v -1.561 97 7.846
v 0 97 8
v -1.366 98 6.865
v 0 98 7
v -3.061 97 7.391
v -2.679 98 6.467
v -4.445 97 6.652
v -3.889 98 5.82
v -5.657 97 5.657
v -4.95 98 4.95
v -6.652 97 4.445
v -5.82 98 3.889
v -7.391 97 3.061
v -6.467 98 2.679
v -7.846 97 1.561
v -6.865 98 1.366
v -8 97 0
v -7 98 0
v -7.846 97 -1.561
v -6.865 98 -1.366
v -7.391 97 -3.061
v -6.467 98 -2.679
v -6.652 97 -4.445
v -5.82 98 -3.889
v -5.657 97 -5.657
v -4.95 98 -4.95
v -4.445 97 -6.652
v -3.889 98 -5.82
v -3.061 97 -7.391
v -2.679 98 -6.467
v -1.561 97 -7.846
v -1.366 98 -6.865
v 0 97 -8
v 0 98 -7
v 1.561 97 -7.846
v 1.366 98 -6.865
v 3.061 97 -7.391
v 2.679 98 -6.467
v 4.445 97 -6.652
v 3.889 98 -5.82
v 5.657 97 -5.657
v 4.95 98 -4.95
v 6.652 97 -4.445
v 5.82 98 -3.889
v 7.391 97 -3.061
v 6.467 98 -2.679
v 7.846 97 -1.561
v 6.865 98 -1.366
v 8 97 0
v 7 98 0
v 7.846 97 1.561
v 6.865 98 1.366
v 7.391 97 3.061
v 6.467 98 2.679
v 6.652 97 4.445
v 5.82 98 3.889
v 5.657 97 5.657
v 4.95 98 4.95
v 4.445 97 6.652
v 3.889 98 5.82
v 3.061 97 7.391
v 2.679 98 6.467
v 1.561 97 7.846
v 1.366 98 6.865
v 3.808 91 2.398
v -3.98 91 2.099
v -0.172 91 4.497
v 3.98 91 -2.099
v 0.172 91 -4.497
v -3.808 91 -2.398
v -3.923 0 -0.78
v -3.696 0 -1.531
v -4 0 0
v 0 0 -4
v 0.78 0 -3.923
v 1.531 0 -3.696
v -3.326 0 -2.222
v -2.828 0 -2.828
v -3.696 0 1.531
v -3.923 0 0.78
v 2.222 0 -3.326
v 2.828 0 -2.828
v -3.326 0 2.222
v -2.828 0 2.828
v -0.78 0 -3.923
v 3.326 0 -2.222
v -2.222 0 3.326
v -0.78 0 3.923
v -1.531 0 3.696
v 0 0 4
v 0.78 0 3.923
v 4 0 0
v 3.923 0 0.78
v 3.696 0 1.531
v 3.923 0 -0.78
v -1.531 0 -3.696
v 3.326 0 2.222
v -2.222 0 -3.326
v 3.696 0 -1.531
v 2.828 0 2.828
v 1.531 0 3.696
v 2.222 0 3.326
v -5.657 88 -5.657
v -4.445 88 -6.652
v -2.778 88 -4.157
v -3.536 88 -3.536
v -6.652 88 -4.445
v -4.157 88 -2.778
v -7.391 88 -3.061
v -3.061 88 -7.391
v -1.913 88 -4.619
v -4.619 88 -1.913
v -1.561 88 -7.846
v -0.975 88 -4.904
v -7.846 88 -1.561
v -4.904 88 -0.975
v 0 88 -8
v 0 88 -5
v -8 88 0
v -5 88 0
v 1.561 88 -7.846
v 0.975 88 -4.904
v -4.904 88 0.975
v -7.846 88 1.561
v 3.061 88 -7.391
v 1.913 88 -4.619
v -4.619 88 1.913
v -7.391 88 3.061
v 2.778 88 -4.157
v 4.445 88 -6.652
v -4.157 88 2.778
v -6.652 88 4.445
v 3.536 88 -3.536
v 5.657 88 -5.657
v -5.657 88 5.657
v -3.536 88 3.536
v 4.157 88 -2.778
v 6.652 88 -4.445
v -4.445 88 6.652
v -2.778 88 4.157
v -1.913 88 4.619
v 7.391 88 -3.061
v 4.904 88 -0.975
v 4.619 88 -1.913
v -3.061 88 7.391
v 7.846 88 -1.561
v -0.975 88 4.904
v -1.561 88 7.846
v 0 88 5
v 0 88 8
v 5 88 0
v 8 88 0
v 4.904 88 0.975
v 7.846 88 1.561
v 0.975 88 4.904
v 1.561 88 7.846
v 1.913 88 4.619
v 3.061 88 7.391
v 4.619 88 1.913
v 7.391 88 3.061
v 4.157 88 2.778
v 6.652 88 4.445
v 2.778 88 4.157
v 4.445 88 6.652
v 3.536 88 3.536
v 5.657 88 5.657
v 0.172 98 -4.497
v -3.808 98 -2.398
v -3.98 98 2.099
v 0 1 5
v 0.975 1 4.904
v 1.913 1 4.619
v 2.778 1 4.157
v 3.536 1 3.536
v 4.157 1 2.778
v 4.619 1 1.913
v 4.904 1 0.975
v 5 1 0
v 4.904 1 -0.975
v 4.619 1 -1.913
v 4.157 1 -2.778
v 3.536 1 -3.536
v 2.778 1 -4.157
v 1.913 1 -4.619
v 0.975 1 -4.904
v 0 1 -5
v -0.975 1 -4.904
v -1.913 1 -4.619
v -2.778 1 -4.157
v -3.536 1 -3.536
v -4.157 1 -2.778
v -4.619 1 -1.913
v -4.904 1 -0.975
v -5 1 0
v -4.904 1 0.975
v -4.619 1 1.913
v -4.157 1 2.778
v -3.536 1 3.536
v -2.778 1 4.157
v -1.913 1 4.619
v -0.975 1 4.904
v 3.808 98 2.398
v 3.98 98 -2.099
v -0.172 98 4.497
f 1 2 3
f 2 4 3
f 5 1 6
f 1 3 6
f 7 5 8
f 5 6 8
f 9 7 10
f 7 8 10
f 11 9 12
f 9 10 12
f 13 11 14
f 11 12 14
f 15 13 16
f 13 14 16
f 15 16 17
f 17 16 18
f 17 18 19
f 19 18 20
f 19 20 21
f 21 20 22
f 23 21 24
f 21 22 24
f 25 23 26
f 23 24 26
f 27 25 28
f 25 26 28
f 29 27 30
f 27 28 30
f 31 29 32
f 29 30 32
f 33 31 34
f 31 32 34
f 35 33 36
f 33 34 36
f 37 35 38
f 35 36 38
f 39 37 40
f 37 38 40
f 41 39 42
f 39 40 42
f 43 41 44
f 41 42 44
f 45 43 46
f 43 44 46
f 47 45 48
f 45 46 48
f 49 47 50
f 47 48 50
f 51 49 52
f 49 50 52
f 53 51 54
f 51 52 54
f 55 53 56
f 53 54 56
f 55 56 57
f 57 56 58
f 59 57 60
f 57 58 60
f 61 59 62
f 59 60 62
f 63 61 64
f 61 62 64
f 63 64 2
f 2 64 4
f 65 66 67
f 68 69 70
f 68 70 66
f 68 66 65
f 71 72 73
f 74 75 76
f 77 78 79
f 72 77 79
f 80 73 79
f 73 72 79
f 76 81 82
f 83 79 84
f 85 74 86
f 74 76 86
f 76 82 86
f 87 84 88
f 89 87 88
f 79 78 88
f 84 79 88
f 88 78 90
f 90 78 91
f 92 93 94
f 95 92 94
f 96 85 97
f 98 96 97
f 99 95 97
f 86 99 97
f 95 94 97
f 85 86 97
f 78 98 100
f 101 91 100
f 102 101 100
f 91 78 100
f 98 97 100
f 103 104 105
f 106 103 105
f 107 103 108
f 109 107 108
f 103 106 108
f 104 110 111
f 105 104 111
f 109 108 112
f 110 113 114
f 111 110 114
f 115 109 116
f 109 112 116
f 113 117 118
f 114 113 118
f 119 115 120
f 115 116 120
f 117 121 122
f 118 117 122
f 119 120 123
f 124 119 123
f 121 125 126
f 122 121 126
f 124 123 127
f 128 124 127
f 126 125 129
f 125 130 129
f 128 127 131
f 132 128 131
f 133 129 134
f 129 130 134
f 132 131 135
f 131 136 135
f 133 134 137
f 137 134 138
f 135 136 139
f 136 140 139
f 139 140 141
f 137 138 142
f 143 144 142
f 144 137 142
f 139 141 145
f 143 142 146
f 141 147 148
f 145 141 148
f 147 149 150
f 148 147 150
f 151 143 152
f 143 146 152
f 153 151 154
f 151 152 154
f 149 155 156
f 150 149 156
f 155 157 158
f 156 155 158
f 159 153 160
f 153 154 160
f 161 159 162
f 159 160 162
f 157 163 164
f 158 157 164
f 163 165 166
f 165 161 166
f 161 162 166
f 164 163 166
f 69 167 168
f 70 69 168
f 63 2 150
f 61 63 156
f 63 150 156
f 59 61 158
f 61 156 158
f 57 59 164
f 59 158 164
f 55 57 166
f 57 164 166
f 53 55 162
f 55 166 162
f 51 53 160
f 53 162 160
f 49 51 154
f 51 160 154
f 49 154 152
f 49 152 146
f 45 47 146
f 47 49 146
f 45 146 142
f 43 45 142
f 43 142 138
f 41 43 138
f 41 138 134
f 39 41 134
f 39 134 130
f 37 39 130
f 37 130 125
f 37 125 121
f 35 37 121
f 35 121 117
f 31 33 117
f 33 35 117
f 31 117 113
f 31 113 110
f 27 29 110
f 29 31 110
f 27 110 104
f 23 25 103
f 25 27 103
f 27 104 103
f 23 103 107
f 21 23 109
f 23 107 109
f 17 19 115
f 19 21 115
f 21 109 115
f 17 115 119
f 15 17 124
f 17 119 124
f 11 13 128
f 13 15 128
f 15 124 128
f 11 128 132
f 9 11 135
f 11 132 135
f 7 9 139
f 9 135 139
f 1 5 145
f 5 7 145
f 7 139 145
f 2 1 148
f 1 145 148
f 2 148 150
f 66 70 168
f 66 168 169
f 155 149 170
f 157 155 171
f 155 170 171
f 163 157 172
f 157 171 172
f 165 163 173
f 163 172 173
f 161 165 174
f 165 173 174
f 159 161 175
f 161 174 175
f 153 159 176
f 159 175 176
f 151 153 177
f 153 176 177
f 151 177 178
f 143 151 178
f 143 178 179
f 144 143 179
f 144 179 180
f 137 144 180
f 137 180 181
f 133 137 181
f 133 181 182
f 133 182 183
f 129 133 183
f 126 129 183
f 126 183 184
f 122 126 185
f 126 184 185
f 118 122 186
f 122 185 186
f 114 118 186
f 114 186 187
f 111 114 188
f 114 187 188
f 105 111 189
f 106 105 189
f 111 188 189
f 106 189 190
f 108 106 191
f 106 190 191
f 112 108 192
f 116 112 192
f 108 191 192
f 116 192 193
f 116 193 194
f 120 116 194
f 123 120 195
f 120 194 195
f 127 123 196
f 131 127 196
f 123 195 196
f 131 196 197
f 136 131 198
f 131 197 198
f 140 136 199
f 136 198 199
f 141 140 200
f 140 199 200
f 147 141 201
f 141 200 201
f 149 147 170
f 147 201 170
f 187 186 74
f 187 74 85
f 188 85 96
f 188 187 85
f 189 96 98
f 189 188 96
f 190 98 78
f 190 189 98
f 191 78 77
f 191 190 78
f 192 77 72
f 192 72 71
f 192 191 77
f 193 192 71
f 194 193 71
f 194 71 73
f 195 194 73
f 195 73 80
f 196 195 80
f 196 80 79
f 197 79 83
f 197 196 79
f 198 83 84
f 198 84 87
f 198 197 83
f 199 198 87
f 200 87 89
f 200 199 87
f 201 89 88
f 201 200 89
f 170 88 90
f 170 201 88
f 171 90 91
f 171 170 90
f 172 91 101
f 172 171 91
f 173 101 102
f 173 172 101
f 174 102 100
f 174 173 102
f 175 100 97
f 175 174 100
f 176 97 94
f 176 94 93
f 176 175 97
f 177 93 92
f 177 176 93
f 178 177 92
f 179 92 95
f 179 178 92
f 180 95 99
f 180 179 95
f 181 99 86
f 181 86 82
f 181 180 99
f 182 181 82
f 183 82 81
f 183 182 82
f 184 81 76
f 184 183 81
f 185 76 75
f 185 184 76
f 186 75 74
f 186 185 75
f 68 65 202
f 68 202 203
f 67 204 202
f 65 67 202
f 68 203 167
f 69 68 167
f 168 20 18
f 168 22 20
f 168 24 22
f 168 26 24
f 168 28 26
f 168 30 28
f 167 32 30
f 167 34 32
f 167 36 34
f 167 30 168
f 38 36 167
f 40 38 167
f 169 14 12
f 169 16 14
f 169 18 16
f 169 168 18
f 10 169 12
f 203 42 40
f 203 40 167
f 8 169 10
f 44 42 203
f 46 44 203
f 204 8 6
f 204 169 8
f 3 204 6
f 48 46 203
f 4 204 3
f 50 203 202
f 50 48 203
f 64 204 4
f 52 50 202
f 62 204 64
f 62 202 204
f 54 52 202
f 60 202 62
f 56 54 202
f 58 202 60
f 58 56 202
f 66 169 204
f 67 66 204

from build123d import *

# Parameters (mm, degrees)
SKETCH1_R           = 5
BOSS_EXTRUDE1_DEPTH = 88
SKETCH2_R           = 8
BOSS_EXTRUDE2_DEPTH = 10
CUT_EXTRUDE1_DEPTH  = 7


with BuildPart() as part:
    # Sketch1 → Boss-Extrude1 (new body)
    with BuildSketch(Plane(origin=(0, 0, 0), x_dir=(1, 0, 0), z_dir=(0, 1, 0))):
        with Locations(Location((0, 0, 0), (0, 0, 270))):
            Circle(SKETCH1_R)
    extrude(amount=BOSS_EXTRUDE1_DEPTH)

    # Sketch2 → Boss-Extrude2 (add)
    with BuildSketch(Plane(origin=(0, 88, 0), x_dir=(1, 0, 0), z_dir=(0, 1, 0))):
        with Locations(Location((0, 0, 0), (0, 0, 270))):
            Circle(SKETCH2_R)
    extrude(amount=BOSS_EXTRUDE2_DEPTH)

    # Sketch3 → Cut-Revolve1 (revolve, cut)
    with BuildSketch(Plane.XY, mode=Mode.PRIVATE) as cut_revolve1_sk:
        Polygon((8, 98), (8, 97), (7, 98), align=None)
    revolve(cut_revolve1_sk.sketch.rotate(Axis((0, 98, 0), (0, -1, 0)), 90), axis=Axis((0, 98, 0), (0, -1, 0)), mode=Mode.SUBTRACT)

    # Sketch4 → Cut-Revolve2 (revolve, cut)
    with BuildSketch(Plane.XY, mode=Mode.PRIVATE) as cut_revolve2_sk:
        Polygon((5, 0), (4, 0), (5, 1), align=None)
    revolve(cut_revolve2_sk.sketch.rotate(Axis((0, 0, 0), (0, 1, 0)), 90), axis=Axis((0, 0, 0), (0, 1, 0)), mode=Mode.SUBTRACT)

    # Sketch5 → Cut-Extrude1 (cut)
    with BuildSketch(Plane(origin=(0, 98, 0), x_dir=(1, 0, 0), z_dir=(0, 1, 0))):
        Polygon((-0.172380767, -4.496697107), (3.808063544, -2.397634677), (3.980444311, 2.09906243), (0.172380767, 4.496697107), (-3.808063544, 2.397634677), (-3.980444311, -2.09906243), align=None)
    extrude(amount=-CUT_EXTRUDE1_DEPTH, mode=Mode.SUBTRACT)


solid = part.part
